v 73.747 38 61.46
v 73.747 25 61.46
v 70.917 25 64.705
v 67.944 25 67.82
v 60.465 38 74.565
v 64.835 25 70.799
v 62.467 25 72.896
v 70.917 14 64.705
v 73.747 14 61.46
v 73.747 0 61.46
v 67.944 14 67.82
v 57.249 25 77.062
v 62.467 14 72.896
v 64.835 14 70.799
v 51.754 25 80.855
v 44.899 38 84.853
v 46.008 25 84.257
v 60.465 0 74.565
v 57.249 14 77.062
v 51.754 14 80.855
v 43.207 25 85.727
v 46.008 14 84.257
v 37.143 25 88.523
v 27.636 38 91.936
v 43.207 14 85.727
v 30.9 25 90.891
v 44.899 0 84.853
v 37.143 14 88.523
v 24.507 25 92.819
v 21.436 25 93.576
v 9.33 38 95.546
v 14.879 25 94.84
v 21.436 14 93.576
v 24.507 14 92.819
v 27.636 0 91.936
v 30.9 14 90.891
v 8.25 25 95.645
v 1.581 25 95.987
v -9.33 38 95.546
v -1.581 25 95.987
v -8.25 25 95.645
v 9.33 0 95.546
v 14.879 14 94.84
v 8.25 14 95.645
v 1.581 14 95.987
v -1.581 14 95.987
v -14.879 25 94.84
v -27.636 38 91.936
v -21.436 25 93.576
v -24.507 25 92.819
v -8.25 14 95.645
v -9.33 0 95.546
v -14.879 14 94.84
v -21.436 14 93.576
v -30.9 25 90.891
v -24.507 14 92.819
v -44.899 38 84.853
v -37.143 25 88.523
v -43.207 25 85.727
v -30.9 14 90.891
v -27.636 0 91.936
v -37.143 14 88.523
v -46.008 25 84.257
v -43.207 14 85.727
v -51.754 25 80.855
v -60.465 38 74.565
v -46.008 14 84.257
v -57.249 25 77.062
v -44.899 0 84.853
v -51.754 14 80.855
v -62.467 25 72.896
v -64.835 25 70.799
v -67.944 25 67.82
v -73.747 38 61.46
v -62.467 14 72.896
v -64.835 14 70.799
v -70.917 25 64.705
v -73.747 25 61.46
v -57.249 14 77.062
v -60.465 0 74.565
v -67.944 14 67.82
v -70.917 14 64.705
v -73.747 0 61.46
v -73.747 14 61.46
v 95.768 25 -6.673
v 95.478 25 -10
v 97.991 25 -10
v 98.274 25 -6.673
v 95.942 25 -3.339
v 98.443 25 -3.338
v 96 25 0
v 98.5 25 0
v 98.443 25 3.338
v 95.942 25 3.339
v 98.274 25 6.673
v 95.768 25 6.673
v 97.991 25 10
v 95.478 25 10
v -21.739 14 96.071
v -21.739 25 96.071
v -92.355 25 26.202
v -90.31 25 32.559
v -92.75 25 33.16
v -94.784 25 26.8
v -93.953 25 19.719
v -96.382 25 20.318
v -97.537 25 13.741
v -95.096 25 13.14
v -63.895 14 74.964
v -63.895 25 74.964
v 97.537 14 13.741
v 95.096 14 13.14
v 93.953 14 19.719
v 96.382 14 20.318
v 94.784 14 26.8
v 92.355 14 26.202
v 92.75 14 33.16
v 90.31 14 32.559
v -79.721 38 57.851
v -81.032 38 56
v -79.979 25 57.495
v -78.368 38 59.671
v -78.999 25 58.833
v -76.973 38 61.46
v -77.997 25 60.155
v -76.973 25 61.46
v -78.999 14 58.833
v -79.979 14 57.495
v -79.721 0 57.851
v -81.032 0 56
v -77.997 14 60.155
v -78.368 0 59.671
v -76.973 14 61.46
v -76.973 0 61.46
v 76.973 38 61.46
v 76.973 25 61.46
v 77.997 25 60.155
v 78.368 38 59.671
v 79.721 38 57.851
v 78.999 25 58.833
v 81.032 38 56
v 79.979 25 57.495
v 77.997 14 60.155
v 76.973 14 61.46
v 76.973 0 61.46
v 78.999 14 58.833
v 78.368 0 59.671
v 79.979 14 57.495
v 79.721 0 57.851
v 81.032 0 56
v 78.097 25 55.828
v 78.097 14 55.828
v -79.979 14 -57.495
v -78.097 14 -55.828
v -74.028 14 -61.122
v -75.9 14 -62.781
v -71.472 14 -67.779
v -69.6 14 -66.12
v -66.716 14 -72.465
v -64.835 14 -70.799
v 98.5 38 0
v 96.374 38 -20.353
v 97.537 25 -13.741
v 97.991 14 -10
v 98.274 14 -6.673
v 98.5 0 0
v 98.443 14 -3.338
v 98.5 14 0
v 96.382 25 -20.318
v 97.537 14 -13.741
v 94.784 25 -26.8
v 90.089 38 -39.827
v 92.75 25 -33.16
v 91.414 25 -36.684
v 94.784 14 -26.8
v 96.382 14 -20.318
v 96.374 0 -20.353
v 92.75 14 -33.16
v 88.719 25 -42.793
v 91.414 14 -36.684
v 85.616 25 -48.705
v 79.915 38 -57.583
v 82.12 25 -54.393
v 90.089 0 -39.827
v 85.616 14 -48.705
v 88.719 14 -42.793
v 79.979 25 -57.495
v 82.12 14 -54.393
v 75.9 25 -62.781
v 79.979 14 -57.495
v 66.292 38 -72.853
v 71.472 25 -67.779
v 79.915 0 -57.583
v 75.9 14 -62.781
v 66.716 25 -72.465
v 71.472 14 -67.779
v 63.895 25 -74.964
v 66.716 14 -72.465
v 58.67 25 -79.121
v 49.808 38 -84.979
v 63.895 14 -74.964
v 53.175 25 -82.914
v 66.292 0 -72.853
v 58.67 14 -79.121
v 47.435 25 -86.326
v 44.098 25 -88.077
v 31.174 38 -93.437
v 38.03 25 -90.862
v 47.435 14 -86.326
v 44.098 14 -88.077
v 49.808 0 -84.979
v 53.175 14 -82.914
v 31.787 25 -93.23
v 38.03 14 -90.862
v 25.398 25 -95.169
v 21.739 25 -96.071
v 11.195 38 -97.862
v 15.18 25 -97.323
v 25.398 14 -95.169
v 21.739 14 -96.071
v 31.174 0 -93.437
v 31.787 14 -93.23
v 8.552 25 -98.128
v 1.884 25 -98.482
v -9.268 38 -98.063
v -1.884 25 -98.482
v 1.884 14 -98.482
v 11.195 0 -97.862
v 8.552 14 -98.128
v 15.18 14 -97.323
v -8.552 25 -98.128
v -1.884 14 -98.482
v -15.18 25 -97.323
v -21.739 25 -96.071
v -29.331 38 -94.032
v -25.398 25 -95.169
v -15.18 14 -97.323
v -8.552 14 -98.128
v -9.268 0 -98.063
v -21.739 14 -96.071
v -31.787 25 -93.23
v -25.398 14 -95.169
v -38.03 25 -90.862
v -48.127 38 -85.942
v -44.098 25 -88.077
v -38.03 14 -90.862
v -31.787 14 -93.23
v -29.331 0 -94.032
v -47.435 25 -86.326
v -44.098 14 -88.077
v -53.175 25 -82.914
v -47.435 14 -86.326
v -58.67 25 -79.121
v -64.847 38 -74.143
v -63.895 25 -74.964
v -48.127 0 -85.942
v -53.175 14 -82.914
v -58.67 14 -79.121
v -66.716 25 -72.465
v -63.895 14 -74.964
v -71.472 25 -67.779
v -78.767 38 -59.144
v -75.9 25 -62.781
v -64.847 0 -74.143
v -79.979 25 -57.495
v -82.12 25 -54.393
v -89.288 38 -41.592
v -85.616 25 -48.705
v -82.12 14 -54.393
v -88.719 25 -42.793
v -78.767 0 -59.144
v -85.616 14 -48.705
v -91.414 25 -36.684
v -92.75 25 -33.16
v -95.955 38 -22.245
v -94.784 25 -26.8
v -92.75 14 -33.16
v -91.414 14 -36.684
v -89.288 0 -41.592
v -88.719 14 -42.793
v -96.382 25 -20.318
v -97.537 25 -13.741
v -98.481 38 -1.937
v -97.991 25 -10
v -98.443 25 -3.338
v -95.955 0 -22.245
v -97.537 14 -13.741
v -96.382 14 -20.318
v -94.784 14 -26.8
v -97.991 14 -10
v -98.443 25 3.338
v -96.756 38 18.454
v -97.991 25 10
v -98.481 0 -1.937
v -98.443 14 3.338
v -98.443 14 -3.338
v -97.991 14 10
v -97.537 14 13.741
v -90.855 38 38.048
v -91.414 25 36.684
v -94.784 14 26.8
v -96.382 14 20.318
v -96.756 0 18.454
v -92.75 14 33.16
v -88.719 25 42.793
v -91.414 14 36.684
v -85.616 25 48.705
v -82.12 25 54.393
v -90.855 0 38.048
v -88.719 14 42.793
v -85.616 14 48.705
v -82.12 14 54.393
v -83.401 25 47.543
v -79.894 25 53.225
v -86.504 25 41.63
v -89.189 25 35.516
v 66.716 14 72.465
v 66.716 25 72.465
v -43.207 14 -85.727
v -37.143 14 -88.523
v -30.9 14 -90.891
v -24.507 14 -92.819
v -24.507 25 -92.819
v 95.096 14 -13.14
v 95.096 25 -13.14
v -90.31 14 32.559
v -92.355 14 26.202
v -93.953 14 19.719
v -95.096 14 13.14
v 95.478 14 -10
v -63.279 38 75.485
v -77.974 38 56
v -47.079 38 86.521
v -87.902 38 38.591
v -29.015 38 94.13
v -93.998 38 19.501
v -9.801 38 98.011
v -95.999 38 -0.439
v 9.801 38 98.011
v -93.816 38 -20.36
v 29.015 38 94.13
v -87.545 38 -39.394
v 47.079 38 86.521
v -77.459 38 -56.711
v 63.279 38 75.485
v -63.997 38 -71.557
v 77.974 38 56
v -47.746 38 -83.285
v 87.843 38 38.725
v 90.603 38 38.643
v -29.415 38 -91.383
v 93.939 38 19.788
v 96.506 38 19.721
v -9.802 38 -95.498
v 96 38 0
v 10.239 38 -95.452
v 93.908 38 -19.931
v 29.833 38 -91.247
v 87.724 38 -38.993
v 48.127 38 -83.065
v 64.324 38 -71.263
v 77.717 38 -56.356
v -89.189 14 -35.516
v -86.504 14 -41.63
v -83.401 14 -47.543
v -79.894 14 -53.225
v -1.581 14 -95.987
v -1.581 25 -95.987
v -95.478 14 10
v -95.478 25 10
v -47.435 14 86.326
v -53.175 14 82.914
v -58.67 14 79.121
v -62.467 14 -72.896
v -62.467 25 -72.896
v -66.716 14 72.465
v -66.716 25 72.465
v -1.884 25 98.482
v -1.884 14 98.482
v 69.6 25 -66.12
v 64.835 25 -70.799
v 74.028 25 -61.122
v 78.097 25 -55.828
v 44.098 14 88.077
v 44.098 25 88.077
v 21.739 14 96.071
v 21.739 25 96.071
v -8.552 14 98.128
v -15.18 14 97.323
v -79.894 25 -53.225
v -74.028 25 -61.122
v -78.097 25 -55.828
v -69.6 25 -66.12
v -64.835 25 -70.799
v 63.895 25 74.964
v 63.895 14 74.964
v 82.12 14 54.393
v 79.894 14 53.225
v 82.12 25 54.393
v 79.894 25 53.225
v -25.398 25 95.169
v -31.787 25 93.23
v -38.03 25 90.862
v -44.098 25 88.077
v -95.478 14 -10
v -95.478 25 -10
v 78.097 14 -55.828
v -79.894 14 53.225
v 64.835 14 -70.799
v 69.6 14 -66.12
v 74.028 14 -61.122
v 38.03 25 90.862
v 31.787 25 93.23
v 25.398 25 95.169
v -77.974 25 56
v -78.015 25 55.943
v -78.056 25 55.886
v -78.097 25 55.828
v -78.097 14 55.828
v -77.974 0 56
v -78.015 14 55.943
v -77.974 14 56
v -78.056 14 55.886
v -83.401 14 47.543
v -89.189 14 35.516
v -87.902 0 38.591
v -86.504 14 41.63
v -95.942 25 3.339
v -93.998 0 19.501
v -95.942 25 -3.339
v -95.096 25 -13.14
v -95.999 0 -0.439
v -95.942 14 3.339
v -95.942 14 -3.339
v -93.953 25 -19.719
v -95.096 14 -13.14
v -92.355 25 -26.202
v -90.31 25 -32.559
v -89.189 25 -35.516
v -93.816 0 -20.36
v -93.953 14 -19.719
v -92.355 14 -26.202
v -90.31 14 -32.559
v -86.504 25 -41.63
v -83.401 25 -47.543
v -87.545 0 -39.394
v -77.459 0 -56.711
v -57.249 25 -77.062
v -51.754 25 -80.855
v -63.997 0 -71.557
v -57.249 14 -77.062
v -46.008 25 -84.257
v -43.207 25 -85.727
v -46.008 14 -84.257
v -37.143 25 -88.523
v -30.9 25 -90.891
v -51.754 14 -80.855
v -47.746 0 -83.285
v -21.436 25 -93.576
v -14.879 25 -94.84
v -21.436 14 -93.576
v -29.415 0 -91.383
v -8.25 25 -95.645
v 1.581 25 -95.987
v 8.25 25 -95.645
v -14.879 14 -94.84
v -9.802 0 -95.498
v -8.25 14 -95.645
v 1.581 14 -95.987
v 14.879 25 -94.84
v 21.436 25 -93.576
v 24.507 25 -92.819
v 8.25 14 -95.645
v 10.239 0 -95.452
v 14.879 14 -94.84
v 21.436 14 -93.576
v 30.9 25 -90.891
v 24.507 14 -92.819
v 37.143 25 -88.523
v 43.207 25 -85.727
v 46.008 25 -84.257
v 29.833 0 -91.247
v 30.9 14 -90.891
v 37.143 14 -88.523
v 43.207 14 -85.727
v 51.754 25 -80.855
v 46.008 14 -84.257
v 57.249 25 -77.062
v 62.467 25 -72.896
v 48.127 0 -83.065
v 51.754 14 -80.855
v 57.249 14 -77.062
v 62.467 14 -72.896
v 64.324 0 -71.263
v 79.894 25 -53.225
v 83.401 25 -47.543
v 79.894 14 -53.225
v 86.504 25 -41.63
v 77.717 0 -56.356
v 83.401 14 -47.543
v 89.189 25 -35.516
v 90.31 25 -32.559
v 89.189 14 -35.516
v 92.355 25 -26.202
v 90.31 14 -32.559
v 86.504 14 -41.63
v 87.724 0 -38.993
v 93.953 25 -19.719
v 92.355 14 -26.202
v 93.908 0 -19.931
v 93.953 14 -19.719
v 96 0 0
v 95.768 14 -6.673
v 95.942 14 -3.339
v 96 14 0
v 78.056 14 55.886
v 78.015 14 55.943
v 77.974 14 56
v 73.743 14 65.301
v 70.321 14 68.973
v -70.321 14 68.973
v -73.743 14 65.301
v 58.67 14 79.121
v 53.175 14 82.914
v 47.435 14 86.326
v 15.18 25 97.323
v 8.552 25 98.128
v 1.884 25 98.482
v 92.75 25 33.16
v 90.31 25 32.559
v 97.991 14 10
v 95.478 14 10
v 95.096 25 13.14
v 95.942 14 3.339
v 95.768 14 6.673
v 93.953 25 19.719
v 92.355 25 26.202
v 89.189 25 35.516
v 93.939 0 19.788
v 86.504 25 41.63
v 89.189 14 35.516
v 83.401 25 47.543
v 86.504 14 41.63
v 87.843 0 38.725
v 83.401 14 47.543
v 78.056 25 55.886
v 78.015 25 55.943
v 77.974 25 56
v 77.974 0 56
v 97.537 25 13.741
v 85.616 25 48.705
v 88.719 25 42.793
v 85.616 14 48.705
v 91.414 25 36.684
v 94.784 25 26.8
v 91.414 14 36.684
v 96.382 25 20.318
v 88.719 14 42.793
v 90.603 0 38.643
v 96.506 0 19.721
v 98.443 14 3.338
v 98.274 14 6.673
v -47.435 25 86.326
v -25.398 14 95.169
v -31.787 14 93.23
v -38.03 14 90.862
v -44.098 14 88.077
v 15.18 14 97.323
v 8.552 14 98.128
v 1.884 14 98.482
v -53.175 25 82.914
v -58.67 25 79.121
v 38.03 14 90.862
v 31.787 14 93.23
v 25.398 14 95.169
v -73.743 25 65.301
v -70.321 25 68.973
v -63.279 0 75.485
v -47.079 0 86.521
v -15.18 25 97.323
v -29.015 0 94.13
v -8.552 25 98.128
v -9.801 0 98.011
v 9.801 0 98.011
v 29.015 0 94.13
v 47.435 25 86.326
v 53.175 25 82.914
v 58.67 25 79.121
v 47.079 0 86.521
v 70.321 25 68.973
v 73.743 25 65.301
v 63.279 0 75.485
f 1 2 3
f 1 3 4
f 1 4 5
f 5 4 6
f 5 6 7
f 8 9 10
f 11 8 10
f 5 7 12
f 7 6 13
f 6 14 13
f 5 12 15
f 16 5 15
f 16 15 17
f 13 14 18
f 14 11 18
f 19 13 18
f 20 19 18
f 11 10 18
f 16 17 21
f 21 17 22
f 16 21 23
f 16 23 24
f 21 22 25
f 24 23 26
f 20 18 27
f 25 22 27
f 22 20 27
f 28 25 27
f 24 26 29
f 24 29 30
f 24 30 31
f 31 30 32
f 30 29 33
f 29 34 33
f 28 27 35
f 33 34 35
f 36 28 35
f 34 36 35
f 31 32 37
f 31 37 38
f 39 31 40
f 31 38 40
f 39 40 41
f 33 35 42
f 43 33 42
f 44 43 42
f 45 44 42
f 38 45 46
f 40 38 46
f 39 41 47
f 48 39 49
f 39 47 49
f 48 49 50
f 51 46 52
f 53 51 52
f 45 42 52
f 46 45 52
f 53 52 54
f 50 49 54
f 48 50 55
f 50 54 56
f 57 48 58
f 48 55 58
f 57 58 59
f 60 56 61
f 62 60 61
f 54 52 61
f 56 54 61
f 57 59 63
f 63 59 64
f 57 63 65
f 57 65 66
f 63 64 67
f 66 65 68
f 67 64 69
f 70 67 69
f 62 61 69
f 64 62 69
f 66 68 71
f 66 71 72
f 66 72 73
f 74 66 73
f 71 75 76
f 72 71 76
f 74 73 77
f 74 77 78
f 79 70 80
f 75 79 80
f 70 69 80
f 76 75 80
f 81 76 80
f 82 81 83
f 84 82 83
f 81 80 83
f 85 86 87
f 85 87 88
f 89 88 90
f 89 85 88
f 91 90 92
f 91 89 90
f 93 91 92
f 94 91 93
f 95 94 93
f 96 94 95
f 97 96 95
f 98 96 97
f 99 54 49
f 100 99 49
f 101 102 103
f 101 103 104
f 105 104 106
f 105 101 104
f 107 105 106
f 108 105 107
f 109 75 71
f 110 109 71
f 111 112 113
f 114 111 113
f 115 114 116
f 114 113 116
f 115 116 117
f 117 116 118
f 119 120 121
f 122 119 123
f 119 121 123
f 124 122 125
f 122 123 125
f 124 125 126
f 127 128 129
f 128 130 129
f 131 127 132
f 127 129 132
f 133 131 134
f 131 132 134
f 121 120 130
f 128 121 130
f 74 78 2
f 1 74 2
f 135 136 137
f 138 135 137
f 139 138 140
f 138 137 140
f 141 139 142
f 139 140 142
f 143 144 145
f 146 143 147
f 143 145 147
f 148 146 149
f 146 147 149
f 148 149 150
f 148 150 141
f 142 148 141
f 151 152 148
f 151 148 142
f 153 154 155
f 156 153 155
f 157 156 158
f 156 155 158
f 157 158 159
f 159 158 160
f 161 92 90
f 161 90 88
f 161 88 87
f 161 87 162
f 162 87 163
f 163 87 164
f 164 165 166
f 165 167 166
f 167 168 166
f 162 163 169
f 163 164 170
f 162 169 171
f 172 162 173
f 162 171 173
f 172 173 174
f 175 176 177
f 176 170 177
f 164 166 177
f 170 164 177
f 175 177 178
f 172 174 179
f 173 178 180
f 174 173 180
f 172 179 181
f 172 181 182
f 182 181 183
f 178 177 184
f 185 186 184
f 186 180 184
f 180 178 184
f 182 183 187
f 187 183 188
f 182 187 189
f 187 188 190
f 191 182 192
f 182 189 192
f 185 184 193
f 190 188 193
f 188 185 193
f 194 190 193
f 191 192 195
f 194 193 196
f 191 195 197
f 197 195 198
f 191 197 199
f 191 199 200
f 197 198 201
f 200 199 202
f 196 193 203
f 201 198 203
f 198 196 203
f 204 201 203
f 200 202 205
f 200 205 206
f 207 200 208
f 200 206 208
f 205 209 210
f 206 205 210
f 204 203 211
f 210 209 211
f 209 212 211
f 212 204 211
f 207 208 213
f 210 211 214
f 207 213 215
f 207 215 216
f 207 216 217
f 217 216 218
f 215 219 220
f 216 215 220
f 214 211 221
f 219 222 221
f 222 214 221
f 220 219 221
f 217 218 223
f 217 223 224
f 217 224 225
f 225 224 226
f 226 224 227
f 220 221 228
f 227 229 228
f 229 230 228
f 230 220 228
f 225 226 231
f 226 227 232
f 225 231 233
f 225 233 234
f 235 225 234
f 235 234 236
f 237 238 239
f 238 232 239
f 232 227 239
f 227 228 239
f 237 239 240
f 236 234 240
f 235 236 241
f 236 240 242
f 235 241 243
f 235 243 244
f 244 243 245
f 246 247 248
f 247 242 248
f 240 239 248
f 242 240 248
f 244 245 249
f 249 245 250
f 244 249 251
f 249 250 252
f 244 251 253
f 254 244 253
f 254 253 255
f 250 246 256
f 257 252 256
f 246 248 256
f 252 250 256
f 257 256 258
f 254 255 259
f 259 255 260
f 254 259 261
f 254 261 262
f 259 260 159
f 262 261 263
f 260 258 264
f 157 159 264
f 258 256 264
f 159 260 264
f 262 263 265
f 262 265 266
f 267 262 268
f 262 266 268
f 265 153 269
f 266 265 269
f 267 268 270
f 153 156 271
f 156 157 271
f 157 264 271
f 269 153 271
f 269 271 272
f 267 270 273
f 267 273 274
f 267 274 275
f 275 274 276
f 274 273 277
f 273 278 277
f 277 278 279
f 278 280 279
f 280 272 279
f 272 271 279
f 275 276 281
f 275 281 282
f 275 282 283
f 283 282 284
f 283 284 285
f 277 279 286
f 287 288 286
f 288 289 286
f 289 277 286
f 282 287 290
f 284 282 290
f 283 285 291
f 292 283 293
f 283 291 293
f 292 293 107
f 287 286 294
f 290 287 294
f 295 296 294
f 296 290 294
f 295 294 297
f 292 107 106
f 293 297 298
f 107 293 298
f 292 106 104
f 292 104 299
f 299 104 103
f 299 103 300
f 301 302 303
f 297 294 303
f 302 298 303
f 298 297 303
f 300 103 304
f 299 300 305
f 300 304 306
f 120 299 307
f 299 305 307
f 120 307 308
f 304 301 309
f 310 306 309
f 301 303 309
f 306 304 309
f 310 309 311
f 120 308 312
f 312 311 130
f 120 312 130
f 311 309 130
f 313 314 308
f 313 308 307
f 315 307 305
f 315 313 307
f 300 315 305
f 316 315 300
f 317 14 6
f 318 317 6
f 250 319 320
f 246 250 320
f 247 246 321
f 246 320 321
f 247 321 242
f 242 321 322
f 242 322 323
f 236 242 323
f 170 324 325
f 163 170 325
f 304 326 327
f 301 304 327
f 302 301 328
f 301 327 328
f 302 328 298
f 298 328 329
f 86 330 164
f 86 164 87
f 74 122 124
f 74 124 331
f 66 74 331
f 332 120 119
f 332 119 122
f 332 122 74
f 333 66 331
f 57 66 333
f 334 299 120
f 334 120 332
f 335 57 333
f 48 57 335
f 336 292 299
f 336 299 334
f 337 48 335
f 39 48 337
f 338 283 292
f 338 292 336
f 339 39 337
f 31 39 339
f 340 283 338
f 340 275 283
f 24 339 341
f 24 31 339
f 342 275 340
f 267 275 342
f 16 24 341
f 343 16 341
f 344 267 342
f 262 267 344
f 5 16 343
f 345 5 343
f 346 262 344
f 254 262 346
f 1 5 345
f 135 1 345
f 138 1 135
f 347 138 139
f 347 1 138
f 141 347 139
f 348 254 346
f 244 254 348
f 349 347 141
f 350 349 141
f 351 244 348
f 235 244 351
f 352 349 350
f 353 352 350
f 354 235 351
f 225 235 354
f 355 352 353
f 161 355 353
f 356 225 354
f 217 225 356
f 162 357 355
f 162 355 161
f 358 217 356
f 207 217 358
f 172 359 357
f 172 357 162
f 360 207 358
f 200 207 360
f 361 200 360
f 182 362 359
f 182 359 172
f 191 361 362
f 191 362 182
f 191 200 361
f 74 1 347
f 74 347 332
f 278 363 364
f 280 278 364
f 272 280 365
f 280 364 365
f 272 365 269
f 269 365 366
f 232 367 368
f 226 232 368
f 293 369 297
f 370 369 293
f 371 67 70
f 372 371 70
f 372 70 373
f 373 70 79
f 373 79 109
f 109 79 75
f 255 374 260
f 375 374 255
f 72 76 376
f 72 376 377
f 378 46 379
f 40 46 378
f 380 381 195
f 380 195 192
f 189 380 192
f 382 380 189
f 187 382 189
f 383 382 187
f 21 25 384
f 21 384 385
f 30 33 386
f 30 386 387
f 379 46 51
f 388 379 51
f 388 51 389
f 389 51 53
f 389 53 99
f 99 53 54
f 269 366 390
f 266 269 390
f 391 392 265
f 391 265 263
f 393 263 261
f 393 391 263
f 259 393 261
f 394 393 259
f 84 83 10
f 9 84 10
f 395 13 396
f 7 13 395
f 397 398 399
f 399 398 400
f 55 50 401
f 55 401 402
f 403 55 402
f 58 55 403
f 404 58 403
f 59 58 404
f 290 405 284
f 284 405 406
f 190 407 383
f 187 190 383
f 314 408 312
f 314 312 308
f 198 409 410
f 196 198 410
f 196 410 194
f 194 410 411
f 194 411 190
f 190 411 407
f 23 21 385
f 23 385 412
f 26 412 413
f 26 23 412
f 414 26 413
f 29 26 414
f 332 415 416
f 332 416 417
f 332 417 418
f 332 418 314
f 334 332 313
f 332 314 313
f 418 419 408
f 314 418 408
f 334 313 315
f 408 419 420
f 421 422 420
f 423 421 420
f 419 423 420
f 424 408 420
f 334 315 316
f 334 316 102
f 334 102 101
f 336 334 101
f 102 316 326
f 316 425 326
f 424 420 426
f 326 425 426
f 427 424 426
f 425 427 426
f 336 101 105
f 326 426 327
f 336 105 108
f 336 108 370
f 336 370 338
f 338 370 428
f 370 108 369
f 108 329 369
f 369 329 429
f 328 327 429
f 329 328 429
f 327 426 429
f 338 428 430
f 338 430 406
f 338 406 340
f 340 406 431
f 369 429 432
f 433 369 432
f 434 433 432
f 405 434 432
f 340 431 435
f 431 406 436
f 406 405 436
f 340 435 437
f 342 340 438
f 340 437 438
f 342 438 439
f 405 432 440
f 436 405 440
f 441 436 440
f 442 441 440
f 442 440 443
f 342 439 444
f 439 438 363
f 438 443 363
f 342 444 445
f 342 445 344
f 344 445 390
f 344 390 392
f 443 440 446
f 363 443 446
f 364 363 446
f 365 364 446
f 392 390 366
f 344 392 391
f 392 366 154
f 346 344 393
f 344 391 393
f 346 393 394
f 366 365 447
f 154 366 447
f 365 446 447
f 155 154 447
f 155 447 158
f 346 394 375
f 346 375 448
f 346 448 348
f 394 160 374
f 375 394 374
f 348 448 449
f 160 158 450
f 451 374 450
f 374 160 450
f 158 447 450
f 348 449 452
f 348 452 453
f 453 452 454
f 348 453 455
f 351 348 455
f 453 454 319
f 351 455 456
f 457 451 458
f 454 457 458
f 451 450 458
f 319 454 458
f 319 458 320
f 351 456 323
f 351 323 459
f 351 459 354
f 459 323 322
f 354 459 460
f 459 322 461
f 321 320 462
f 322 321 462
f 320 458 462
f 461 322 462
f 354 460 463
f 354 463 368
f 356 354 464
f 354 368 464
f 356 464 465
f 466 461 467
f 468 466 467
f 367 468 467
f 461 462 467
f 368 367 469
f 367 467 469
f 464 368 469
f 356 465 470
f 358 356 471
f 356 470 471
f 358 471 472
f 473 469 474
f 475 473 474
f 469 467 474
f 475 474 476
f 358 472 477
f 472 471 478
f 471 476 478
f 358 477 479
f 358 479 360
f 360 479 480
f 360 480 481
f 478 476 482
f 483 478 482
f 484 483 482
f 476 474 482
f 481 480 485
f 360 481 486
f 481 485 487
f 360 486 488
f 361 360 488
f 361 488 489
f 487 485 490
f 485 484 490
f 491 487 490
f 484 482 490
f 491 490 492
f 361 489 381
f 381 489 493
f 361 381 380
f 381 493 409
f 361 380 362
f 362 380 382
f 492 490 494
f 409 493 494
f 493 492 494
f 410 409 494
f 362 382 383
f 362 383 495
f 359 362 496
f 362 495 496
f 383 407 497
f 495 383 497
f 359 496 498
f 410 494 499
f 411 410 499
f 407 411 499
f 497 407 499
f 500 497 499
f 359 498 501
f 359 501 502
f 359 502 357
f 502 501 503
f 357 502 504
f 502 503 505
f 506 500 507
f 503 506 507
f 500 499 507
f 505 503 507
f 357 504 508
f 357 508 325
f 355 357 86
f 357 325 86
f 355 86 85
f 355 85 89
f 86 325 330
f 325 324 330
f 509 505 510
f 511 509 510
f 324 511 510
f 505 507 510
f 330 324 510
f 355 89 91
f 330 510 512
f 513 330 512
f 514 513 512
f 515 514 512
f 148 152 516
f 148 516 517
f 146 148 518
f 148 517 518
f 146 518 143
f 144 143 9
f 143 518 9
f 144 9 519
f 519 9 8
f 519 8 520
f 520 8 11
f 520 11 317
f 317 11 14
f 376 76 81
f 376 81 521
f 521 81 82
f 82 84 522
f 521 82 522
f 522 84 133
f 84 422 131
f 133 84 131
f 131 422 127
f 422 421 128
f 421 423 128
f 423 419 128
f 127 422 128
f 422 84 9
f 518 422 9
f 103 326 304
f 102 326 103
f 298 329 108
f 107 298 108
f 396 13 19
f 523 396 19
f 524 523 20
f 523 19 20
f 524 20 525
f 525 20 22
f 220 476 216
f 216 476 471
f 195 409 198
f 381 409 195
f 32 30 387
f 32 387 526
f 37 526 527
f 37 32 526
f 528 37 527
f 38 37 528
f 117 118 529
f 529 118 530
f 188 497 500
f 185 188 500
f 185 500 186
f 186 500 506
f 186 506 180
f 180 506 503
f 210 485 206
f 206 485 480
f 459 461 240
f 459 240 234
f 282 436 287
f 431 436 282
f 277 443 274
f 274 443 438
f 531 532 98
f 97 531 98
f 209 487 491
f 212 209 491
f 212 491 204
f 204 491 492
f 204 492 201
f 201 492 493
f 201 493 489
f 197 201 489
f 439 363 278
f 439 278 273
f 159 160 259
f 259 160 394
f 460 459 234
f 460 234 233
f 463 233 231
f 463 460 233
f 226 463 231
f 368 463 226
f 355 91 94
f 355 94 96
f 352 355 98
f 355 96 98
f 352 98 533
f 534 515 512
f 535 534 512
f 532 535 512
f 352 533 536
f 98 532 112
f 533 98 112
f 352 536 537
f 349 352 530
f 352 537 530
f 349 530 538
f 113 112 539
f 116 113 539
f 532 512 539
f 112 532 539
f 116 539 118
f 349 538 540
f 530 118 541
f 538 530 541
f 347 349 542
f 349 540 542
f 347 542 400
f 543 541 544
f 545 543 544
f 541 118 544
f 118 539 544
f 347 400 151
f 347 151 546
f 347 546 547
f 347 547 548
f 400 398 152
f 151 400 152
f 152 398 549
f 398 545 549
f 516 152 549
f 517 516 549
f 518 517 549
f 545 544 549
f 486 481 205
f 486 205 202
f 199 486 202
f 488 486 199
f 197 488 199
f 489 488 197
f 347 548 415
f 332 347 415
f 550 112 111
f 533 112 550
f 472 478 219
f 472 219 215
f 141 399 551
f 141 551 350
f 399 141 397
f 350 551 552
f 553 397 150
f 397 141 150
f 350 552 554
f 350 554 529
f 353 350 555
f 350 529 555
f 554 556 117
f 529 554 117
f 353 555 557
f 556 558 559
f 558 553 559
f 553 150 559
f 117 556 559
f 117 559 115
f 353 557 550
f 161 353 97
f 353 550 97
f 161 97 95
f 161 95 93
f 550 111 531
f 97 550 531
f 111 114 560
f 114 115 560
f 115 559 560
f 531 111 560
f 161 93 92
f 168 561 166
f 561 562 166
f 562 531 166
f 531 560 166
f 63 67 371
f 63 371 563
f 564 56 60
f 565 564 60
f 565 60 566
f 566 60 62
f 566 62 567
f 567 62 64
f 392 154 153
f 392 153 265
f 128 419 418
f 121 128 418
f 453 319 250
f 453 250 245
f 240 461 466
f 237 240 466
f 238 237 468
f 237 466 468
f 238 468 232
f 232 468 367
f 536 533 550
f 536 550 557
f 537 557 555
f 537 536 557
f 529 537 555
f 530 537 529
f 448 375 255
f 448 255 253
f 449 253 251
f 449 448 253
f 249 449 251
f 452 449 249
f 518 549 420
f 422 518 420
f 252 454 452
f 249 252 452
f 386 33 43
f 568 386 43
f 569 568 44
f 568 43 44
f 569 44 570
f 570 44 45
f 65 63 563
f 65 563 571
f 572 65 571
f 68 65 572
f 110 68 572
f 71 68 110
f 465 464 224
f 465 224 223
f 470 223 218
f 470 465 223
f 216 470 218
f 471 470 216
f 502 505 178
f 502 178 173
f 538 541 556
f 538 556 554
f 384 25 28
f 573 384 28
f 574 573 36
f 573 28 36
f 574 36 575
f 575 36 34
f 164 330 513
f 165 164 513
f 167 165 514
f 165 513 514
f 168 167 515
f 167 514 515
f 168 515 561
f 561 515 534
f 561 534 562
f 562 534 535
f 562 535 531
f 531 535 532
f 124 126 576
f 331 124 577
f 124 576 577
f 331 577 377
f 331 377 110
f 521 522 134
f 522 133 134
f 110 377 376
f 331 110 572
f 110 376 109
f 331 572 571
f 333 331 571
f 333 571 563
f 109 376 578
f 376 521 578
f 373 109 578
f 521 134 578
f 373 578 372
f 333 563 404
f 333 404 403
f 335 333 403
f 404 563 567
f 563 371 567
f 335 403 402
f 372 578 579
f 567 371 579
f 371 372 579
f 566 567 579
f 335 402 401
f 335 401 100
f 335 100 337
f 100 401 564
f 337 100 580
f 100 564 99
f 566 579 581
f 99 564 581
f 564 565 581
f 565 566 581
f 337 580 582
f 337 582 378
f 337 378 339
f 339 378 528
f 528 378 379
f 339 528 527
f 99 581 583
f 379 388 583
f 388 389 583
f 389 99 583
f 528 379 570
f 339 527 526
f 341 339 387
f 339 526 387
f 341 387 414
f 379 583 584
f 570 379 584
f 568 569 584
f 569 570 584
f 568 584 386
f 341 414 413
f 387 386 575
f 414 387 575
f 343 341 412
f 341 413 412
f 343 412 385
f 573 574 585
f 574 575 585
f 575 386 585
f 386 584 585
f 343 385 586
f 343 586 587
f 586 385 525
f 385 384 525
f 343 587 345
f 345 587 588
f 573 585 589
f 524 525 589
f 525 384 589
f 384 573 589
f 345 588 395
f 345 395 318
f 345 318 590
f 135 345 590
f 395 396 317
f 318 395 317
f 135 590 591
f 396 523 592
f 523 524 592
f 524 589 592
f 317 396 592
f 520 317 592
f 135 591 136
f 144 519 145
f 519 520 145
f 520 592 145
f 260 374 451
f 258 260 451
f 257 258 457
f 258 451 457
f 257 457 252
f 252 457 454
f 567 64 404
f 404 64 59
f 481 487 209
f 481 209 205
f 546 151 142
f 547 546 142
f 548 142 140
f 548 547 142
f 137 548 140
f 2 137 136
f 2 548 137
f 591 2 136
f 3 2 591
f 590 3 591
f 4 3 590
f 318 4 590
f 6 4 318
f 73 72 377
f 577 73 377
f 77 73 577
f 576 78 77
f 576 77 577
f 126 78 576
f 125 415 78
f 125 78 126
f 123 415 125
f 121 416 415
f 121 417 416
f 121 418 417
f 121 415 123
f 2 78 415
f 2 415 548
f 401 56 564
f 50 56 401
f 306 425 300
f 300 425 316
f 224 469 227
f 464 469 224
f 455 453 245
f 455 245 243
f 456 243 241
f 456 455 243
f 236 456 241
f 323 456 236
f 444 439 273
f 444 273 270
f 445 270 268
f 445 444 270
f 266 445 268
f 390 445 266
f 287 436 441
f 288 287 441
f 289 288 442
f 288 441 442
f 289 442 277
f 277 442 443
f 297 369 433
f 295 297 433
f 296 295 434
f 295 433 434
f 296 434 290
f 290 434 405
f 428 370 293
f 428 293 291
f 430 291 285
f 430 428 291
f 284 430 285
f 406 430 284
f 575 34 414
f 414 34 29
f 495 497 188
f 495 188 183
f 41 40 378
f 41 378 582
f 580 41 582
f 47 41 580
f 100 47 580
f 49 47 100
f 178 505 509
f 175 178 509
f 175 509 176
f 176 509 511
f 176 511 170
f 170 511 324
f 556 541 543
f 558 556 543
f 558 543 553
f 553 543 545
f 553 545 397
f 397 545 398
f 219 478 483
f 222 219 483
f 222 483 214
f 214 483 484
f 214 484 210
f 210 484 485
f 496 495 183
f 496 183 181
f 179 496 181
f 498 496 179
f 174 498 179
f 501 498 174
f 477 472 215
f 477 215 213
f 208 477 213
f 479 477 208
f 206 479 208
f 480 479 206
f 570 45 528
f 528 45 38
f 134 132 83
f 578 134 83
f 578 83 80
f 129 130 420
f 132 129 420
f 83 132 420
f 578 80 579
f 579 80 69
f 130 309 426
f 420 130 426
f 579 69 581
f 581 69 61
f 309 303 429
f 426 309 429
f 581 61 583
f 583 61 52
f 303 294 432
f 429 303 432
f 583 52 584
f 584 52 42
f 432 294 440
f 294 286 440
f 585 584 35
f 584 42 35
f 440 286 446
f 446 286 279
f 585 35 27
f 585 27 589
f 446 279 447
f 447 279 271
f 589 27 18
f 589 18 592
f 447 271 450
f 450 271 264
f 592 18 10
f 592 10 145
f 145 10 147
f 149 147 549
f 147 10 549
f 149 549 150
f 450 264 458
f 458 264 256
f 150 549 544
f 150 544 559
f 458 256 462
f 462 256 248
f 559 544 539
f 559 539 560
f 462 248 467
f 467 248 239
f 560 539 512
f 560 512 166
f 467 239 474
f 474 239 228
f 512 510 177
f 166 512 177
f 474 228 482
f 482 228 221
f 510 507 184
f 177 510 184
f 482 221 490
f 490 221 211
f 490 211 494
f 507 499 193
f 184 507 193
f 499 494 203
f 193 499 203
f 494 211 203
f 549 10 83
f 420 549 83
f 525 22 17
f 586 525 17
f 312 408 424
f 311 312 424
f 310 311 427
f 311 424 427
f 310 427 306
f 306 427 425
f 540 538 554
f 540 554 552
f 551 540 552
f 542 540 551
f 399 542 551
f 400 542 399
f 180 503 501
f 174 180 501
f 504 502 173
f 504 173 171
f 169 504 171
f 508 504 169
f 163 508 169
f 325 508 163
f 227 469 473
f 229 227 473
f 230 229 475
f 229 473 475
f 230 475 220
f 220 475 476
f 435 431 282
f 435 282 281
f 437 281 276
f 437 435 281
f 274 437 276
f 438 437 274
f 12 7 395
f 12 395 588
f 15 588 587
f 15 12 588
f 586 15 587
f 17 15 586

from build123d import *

# Parameters (mm, degrees)
BOSS_EXTRUDE1_DEPTH = 38
SKETCH2_W           = 20
SKETCH2_H           = 11
CUT_EXTRUDE1_DEPTH  = 145.390096613
CIRPATTERN1_COUNT   = 26


with BuildPart() as part:
    # Sketch1 → Boss-Extrude1 (new body)
    with BuildSketch(Plane(origin=(0, 0, 0), x_dir=(1, 0, 0), z_dir=(0, 1, 0))):
        with BuildLine():
            ThreePointArc((76.973491541, -61.46), (79.050100656, -58.765054125), (81.032400927, -56))
            Line((81.032400927, -56), (77.974354758, -56))
            ThreePointArc((77.974354758, -56), (75.90994771, -58.76801714), (73.747328087, -61.46))
            Line((73.747328087, -61.46), (76.973491541, -61.46))
        make_face()
        with BuildLine():
            ThreePointArc((73.747328087, -61.46), (75.90994771, -58.76801714), (77.974354758, -56))
            Line((77.974354758, -56), (-77.974354758, -56))
            ThreePointArc((-77.974354758, -56), (-75.90994771, -58.76801714), (-73.747328087, -61.46))
            Line((-73.747328087, -61.46), (73.747328087, -61.46))
        make_face()
        with BuildLine():
            ThreePointArc((-73.747328087, -61.46), (-75.90994771, -58.76801714), (-77.974354758, -56))
            Line((-77.974354758, -56), (-81.032400927, -56))
            ThreePointArc((-81.032400927, -56), (-79.050100656, -58.765054125), (-76.973491541, -61.46))
            Line((-76.973491541, -61.46), (-73.747328087, -61.46))
        make_face()
        with BuildLine():
            Line((77.974354758, -56), (81.032400927, -56))
            ThreePointArc((81.032400927, -56), (94.031753922, -29.330517458), (98.5, 0))
            ThreePointArc((98.5, 0), (-29.330517458, 94.031753922), (-81.032400927, -56))
            Line((-81.032400927, -56), (-77.974354758, -56))
            ThreePointArc((-77.974354758, -56), (-29.414808713, 91.382542252), (96, 0))
            ThreePointArc((96, 0), (91.382542252, -29.414808713), (77.974354758, -56))
        make_face()
        with BuildLine():
            ThreePointArc((-76.973491541, -61.46), (0, -98.5), (76.973491541, -61.46))
            Line((76.973491541, -61.46), (73.747328087, -61.46))
            ThreePointArc((73.747328087, -61.46), (0, -96), (-73.747328087, -61.46))
            Line((-73.747328087, -61.46), (-76.973491541, -61.46))
        make_face()
    extrude(amount=BOSS_EXTRUDE1_DEPTH)

    # Sketch2 → Cut-Extrude1 (cut, through all)
    with BuildSketch(Plane(origin=(0, 0, 0), x_dir=(0, 0, -1), z_dir=(1, 0, 0))):
        with Locations((0, 19.5)):
            Rectangle(SKETCH2_W, SKETCH2_H)
    cut_extrude1 = extrude(amount=-CUT_EXTRUDE1_DEPTH, mode=Mode.SUBTRACT)

    # CirPattern1: Cut-Extrude1 ×26 about axis
    cirpattern1_axis = Axis((0, 0, 0), (0, 1, 0))
    for i in range(1, CIRPATTERN1_COUNT):
        add(cut_extrude1.rotate(cirpattern1_axis, i * 360 / CIRPATTERN1_COUNT), mode=Mode.SUBTRACT)


solid = part.part
